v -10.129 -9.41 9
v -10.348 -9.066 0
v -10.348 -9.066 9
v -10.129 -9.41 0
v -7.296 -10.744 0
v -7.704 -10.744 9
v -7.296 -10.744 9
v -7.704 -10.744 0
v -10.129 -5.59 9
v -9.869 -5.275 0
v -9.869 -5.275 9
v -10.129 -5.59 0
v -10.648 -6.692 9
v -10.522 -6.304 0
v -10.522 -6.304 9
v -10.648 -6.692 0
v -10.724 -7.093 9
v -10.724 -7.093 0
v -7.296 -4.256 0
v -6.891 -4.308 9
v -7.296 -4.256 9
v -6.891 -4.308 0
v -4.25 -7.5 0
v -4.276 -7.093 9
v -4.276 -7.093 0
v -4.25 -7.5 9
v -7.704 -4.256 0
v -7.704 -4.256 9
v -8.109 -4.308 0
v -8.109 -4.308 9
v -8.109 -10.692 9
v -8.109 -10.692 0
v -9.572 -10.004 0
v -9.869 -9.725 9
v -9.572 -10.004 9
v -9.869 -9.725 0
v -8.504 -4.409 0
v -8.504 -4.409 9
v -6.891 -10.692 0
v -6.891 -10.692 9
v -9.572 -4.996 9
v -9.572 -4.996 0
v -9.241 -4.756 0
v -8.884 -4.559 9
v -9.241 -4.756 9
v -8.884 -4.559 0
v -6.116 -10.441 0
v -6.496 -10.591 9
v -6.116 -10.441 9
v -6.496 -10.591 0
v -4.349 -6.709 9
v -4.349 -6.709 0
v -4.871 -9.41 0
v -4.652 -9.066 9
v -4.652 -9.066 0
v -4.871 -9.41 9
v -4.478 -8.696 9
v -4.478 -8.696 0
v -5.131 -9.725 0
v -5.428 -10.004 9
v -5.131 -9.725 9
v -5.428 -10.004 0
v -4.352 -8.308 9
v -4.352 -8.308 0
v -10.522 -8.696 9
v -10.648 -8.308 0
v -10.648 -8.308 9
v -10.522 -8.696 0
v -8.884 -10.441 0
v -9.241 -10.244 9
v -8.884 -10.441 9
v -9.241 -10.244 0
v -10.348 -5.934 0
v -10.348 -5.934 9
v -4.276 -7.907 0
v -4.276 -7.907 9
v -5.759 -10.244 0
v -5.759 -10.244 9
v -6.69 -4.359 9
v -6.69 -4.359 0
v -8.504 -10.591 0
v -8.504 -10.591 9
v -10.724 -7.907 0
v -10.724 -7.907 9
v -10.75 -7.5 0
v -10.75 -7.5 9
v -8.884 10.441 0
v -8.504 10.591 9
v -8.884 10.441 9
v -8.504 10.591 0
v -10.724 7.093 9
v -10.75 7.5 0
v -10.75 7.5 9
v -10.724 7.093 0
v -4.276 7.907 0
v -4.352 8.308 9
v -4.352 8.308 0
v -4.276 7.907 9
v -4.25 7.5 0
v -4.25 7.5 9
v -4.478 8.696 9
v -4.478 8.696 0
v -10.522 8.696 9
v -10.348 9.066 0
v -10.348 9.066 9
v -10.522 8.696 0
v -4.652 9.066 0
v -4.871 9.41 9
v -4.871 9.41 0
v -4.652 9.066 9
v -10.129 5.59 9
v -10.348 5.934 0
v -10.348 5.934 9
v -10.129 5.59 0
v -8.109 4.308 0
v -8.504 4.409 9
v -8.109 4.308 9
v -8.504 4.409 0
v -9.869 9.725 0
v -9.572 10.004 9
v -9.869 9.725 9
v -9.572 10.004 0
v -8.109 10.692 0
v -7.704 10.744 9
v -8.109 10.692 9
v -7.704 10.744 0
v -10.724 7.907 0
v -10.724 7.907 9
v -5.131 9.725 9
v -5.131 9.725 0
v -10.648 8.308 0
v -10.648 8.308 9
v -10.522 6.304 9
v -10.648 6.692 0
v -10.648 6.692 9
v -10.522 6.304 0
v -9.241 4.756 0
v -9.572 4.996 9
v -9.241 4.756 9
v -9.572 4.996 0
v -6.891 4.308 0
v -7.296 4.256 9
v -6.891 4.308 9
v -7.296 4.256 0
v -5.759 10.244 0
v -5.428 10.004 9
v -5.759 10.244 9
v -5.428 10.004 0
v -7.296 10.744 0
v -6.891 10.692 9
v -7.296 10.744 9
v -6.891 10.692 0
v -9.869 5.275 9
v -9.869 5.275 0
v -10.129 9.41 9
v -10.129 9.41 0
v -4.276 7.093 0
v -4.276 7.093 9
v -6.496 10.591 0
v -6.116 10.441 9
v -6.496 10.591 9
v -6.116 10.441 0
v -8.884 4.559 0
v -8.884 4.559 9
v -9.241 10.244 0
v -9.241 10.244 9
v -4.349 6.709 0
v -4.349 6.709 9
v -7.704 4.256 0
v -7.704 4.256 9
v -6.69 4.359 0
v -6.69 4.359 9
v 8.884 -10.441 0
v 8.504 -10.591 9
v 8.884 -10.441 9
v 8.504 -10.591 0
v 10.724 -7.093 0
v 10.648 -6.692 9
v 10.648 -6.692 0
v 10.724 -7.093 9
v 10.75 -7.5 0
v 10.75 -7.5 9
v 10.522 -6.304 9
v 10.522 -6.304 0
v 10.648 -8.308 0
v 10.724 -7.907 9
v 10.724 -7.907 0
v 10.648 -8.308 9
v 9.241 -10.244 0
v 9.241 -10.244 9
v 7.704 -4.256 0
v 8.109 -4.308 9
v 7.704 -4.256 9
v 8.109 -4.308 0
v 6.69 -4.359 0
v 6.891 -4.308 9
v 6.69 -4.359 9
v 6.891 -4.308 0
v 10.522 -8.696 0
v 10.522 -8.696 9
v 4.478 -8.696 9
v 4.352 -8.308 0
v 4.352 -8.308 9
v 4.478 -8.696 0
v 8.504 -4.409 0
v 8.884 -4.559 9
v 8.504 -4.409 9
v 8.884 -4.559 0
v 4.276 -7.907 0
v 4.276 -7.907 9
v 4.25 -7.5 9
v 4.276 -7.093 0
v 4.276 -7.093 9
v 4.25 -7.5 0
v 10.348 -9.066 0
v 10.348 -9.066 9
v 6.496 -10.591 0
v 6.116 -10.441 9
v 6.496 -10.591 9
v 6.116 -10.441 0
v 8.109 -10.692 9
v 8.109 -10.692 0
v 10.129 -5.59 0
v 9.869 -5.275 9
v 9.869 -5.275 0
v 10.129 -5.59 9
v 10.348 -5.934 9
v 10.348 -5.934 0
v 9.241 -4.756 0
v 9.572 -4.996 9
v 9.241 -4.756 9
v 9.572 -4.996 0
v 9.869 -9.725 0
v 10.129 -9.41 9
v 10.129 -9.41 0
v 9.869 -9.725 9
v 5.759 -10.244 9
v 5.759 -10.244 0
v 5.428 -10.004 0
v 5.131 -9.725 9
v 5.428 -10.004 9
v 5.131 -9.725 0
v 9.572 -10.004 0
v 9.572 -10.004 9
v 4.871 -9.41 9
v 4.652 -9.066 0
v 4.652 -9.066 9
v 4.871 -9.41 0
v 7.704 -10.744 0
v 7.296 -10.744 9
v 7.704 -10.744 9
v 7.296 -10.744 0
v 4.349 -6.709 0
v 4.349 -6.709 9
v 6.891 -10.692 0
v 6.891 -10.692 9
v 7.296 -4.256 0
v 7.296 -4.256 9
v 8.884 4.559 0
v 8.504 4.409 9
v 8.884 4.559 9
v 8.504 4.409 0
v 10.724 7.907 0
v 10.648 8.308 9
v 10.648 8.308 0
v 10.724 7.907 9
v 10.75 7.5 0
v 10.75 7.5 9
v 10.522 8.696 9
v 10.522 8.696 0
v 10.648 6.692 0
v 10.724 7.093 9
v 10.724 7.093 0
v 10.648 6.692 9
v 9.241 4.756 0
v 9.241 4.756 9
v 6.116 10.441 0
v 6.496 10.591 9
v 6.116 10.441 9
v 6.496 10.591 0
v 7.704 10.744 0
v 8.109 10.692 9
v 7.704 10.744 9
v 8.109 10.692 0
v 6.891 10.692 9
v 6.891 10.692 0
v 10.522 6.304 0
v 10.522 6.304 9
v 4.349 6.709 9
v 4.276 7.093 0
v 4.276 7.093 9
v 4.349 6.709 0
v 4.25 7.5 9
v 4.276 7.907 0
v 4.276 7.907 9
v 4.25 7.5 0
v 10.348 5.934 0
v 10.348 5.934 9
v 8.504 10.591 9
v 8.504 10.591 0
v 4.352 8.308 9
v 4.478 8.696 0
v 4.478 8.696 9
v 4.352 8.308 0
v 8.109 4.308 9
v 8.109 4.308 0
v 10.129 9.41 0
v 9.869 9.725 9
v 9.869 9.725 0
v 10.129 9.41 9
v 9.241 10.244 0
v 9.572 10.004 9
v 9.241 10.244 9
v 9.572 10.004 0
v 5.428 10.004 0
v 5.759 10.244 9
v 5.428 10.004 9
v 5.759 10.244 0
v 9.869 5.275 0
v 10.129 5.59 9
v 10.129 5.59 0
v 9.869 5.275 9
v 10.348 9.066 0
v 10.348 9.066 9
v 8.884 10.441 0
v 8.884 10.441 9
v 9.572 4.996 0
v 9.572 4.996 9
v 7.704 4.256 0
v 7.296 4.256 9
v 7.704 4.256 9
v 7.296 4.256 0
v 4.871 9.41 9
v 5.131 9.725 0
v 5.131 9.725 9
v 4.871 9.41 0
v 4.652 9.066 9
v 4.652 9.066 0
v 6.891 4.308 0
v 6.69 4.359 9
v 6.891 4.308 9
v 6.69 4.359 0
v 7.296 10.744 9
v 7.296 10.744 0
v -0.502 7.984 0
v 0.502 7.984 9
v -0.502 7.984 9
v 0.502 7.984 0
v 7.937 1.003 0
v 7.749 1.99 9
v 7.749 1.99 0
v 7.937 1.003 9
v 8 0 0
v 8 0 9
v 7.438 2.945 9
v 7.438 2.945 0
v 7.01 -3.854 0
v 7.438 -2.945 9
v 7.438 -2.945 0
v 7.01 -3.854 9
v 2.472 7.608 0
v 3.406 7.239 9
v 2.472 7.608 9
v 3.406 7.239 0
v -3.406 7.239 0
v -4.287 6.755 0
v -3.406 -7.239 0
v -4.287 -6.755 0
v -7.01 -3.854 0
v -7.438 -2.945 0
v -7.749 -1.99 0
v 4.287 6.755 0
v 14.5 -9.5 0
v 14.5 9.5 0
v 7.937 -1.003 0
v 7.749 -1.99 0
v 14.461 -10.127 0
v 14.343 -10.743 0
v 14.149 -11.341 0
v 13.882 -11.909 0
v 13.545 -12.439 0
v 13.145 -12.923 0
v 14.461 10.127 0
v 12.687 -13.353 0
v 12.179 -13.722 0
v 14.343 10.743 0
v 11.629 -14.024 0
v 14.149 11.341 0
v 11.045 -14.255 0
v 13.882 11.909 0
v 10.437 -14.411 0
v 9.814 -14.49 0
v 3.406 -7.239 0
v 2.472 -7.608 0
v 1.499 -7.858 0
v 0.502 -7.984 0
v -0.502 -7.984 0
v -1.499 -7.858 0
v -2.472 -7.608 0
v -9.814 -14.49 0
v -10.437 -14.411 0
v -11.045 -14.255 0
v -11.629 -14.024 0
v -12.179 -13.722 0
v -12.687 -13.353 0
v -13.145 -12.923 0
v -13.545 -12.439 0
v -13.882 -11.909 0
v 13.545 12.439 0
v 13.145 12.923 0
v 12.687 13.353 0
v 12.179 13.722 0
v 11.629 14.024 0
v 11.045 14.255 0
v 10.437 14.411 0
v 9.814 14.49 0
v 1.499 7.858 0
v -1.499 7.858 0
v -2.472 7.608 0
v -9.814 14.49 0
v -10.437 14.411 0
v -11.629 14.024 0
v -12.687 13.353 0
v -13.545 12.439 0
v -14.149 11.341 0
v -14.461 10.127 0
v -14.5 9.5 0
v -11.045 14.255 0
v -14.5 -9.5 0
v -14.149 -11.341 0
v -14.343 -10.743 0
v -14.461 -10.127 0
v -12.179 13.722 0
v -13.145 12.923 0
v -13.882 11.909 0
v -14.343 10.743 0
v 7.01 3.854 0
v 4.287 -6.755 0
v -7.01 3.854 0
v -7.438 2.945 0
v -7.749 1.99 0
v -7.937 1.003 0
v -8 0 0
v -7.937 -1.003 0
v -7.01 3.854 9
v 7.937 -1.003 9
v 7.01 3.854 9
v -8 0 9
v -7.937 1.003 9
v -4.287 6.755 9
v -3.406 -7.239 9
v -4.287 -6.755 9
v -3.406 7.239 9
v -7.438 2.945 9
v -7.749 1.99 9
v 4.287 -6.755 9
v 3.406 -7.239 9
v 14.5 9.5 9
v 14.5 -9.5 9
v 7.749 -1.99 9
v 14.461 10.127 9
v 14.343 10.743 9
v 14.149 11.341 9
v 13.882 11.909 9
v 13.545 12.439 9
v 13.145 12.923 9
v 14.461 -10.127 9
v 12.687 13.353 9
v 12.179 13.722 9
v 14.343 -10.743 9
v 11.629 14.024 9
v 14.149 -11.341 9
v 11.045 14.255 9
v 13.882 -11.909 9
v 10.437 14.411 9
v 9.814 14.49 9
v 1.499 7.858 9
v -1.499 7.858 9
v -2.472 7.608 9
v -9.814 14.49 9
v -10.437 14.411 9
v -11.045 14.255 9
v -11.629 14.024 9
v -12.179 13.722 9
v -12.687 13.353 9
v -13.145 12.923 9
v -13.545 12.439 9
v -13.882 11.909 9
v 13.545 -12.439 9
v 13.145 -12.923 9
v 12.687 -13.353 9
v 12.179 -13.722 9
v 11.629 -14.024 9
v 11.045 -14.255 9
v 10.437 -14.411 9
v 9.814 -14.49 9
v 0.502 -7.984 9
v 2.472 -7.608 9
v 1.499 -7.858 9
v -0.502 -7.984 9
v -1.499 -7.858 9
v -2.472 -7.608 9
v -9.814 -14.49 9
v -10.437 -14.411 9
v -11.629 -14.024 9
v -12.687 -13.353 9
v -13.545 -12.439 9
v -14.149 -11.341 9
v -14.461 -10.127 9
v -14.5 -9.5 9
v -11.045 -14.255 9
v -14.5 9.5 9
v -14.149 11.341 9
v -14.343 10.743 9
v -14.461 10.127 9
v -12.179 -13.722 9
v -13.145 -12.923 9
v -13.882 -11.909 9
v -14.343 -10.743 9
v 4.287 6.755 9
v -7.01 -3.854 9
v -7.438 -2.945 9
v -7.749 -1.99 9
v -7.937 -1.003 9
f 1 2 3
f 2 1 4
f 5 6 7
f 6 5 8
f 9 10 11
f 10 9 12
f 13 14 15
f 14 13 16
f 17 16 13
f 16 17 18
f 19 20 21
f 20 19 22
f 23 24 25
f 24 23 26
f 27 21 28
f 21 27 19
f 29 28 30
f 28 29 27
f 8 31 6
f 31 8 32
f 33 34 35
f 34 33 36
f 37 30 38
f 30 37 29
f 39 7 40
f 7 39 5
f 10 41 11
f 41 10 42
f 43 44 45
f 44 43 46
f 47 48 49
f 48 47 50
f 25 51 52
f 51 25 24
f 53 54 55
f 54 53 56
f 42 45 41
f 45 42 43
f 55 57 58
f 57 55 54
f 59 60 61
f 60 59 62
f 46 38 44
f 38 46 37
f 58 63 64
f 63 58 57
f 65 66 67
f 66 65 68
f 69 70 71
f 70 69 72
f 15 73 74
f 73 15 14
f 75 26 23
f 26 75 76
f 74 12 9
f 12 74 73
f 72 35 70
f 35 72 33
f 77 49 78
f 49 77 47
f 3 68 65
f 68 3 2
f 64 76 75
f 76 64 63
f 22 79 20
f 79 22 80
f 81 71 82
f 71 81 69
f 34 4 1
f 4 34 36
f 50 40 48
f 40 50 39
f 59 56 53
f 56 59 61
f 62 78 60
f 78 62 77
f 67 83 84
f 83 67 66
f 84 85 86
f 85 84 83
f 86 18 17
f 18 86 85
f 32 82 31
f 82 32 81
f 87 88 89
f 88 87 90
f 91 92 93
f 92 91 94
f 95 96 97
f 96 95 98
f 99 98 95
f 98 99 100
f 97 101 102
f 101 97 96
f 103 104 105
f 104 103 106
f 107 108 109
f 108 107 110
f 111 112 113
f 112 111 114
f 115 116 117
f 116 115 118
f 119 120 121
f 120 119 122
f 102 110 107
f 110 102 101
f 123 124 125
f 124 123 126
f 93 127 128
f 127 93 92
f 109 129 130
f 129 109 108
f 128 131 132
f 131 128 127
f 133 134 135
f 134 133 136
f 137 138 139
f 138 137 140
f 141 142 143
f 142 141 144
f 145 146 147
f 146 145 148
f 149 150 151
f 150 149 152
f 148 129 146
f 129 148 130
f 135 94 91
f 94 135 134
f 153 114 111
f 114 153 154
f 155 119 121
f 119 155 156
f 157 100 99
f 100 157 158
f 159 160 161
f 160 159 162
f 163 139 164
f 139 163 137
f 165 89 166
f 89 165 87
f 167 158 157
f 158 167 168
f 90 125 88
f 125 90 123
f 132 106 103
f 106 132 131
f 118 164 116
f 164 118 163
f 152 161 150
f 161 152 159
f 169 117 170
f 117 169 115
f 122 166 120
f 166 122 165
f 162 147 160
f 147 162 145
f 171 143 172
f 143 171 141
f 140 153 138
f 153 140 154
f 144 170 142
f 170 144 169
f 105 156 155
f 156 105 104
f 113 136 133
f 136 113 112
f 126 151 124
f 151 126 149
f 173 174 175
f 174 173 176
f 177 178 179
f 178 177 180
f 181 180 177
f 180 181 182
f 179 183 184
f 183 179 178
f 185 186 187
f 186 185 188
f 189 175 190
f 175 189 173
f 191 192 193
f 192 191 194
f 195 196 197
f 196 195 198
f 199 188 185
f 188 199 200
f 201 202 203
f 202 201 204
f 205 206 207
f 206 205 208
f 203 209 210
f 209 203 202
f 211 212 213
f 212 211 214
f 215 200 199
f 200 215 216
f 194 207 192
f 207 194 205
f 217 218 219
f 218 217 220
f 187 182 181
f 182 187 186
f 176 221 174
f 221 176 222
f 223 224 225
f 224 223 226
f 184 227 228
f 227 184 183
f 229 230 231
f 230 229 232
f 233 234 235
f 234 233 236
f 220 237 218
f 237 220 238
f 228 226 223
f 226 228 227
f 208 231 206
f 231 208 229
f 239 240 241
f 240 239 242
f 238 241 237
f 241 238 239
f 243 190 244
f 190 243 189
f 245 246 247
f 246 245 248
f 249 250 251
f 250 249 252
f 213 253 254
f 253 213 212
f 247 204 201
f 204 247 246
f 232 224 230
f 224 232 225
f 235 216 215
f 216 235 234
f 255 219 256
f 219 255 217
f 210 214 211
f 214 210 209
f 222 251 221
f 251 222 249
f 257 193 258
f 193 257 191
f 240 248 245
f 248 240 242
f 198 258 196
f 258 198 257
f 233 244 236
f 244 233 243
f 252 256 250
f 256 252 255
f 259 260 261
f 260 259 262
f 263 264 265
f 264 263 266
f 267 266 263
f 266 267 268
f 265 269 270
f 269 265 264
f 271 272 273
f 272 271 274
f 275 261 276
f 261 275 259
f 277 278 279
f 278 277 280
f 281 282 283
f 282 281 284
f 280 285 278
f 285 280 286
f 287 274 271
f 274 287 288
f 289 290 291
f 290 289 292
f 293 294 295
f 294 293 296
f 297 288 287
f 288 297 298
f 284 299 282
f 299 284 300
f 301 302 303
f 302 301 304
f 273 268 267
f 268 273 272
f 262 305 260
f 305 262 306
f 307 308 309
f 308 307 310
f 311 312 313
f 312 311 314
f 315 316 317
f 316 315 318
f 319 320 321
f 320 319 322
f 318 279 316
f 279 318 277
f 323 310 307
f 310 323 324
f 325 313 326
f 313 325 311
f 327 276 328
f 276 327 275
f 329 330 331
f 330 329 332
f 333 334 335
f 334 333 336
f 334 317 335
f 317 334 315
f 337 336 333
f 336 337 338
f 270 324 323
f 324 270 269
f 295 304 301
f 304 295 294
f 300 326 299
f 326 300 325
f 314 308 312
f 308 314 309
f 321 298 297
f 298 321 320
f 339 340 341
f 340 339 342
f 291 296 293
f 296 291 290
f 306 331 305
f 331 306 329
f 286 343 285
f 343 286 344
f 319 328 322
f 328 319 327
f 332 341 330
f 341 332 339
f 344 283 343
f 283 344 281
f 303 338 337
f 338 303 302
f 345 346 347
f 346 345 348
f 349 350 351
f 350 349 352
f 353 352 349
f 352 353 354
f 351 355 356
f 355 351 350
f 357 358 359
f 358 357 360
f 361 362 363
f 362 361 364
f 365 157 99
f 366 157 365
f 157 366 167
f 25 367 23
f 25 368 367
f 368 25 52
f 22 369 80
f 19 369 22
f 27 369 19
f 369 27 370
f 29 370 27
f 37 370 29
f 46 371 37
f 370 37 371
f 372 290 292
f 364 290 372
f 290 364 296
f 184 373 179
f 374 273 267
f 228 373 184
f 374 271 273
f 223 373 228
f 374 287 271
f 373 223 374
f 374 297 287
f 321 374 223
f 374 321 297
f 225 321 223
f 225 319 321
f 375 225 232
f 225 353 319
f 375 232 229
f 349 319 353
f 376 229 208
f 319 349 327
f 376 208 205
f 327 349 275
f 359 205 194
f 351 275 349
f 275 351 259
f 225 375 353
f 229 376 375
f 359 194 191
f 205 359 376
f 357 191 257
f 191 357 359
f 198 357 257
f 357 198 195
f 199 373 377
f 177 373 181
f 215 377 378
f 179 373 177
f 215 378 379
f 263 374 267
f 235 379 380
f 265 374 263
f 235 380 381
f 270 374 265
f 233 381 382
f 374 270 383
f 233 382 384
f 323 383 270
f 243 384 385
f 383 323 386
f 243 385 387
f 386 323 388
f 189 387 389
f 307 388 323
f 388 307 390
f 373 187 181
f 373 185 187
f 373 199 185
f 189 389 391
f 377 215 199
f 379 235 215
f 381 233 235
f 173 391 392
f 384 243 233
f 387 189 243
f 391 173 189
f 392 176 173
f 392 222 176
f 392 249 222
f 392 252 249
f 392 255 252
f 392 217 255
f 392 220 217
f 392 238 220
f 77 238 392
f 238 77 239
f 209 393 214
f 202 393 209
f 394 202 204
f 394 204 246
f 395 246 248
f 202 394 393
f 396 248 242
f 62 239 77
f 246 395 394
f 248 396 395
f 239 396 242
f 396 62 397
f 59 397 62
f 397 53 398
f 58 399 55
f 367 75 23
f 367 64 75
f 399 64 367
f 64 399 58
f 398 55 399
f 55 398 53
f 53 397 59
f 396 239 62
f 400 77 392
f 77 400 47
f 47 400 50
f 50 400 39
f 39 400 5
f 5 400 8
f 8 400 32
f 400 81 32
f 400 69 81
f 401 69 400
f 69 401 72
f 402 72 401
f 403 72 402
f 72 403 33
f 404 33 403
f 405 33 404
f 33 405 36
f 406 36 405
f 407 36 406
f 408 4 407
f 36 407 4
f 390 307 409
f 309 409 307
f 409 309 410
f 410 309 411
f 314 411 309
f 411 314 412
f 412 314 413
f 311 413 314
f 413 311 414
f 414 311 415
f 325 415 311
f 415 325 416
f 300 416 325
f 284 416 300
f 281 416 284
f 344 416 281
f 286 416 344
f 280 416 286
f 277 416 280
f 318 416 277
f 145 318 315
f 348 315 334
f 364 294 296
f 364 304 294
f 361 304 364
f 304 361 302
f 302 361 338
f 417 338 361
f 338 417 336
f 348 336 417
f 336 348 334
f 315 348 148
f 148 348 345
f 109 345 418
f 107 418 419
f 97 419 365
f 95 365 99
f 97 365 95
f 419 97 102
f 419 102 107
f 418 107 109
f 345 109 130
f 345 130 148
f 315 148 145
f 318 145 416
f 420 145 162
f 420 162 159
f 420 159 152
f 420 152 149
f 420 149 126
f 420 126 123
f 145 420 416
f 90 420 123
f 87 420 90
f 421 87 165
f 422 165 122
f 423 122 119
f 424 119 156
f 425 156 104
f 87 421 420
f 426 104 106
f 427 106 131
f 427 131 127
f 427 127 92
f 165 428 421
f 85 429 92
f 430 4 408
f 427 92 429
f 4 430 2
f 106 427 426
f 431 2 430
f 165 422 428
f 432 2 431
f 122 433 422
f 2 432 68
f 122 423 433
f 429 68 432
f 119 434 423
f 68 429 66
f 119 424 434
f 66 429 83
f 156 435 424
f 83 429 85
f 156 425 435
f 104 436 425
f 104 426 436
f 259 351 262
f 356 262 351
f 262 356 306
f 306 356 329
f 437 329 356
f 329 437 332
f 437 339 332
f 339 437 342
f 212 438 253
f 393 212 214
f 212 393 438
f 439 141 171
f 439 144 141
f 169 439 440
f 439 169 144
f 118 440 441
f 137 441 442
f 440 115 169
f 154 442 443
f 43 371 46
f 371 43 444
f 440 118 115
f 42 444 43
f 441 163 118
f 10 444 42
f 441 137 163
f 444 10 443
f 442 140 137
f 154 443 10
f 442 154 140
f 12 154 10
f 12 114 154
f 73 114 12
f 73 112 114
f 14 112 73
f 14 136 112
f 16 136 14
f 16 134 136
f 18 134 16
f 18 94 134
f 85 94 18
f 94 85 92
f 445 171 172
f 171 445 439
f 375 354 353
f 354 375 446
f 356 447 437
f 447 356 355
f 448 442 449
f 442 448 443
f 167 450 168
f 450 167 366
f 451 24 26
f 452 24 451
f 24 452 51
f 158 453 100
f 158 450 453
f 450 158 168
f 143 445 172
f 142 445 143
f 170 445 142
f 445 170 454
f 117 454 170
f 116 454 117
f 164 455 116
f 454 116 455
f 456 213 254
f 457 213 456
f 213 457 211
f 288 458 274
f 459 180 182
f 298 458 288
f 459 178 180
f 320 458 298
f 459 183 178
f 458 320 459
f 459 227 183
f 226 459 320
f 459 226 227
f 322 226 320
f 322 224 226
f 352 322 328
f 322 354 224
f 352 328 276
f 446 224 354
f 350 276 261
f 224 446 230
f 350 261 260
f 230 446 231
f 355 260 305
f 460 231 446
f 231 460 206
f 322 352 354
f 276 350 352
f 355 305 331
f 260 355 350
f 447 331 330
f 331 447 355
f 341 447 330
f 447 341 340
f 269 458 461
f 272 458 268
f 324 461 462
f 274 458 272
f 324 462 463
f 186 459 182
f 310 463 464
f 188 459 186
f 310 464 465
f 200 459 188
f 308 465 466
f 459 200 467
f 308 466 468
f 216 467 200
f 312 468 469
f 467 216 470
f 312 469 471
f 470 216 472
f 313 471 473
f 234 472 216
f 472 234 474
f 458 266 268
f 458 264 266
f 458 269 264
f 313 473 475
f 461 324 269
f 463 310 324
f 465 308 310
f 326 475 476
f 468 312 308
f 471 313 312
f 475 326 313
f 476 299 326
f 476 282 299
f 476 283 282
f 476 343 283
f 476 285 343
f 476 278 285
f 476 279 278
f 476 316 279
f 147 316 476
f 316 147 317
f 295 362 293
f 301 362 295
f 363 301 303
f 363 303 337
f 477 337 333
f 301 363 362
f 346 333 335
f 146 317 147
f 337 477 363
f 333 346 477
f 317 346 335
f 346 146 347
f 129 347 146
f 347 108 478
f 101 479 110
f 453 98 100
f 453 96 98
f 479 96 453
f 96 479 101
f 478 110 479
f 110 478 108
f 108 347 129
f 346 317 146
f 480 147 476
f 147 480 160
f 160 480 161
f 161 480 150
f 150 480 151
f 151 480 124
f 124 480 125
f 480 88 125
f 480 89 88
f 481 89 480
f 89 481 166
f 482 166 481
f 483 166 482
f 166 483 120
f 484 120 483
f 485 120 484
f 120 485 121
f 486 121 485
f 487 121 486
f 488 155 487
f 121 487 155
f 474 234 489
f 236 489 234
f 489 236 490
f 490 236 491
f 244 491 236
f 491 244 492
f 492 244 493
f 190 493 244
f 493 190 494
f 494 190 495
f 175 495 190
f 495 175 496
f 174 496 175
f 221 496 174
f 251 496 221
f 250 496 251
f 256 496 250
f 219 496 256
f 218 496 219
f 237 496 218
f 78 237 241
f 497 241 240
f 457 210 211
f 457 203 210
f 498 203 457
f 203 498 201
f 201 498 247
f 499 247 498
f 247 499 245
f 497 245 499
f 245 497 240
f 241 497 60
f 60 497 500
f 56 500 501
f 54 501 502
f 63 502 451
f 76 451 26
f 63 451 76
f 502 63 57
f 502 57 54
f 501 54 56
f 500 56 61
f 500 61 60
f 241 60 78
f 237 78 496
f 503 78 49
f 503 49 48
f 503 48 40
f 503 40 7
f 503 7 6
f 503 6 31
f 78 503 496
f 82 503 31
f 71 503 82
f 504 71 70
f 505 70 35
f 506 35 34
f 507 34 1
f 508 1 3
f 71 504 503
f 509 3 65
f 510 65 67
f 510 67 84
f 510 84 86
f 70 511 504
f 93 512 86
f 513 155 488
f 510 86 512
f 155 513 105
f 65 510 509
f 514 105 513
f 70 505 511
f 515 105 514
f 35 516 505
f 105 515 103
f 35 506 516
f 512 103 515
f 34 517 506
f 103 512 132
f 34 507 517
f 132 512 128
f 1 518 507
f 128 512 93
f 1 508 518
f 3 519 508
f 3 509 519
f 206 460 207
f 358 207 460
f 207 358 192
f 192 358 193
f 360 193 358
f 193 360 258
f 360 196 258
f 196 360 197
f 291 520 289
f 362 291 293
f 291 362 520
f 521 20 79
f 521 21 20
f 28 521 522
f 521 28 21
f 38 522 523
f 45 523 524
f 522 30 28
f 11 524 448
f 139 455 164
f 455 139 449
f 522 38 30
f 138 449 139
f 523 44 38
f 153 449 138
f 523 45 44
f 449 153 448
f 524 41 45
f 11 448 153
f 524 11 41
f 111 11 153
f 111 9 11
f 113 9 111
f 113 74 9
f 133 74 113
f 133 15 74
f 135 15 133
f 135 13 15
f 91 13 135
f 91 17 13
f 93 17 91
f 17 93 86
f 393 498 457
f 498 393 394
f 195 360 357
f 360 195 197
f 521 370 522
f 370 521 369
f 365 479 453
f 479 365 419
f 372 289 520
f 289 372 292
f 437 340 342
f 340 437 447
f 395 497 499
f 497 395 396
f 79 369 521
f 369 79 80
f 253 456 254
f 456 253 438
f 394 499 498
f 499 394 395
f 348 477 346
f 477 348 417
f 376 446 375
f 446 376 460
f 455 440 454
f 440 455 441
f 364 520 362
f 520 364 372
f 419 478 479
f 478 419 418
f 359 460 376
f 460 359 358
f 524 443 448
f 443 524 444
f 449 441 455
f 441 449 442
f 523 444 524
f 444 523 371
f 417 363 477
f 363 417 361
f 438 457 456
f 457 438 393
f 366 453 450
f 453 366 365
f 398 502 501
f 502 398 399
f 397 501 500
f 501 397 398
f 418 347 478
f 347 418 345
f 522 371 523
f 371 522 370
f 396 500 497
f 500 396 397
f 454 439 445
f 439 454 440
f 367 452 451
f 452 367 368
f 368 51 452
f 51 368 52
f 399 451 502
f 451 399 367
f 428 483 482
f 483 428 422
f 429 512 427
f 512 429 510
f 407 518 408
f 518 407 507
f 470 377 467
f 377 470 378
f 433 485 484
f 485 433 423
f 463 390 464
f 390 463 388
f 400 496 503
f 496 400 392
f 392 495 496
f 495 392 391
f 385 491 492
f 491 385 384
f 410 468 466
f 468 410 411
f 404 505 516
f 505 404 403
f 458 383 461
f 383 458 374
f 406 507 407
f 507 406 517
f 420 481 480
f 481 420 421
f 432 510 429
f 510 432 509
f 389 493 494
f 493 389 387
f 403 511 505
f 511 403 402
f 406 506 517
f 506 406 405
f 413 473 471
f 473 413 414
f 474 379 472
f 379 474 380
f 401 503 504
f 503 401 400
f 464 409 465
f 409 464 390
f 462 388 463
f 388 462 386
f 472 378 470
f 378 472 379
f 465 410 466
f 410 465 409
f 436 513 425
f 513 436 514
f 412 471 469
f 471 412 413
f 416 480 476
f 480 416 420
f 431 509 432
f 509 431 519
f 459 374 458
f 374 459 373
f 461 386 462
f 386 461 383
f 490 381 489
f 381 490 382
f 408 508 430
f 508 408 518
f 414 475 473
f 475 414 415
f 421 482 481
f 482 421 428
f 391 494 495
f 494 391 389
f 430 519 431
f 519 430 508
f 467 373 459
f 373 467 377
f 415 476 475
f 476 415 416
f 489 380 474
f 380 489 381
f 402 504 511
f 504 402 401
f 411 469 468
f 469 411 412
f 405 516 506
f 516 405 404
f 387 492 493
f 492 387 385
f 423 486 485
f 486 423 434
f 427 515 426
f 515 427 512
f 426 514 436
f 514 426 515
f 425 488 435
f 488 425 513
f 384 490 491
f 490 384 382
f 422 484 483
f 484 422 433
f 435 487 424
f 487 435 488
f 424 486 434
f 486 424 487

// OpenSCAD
$fn = 50;


difference() {
	union() {
		hull() {
			translate(v = [-9.5000000000, 9.5000000000, 0]) {
				cylinder(h = 9, r = 5);
			}
			translate(v = [9.5000000000, 9.5000000000, 0]) {
				cylinder(h = 9, r = 5);
			}
			translate(v = [-9.5000000000, -9.5000000000, 0]) {
				cylinder(h = 9, r = 5);
			}
			translate(v = [9.5000000000, -9.5000000000, 0]) {
				cylinder(h = 9, r = 5);
			}
		}
	}
	union() {
		#translate(v = [-7.5000000000, -7.5000000000, -100.0000000000]) {
			cylinder(h = 200, r = 3.2500000000);
		}
		#translate(v = [-7.5000000000, 7.5000000000, -100.0000000000]) {
			cylinder(h = 200, r = 3.2500000000);
		}
		#translate(v = [7.5000000000, -7.5000000000, -100.0000000000]) {
			cylinder(h = 200, r = 3.2500000000);
		}
		#translate(v = [7.5000000000, 7.5000000000, -100.0000000000]) {
			cylinder(h = 200, r = 3.2500000000);
		}
		#cylinder(h = 9, r = 8.0000000000);
	}
}
